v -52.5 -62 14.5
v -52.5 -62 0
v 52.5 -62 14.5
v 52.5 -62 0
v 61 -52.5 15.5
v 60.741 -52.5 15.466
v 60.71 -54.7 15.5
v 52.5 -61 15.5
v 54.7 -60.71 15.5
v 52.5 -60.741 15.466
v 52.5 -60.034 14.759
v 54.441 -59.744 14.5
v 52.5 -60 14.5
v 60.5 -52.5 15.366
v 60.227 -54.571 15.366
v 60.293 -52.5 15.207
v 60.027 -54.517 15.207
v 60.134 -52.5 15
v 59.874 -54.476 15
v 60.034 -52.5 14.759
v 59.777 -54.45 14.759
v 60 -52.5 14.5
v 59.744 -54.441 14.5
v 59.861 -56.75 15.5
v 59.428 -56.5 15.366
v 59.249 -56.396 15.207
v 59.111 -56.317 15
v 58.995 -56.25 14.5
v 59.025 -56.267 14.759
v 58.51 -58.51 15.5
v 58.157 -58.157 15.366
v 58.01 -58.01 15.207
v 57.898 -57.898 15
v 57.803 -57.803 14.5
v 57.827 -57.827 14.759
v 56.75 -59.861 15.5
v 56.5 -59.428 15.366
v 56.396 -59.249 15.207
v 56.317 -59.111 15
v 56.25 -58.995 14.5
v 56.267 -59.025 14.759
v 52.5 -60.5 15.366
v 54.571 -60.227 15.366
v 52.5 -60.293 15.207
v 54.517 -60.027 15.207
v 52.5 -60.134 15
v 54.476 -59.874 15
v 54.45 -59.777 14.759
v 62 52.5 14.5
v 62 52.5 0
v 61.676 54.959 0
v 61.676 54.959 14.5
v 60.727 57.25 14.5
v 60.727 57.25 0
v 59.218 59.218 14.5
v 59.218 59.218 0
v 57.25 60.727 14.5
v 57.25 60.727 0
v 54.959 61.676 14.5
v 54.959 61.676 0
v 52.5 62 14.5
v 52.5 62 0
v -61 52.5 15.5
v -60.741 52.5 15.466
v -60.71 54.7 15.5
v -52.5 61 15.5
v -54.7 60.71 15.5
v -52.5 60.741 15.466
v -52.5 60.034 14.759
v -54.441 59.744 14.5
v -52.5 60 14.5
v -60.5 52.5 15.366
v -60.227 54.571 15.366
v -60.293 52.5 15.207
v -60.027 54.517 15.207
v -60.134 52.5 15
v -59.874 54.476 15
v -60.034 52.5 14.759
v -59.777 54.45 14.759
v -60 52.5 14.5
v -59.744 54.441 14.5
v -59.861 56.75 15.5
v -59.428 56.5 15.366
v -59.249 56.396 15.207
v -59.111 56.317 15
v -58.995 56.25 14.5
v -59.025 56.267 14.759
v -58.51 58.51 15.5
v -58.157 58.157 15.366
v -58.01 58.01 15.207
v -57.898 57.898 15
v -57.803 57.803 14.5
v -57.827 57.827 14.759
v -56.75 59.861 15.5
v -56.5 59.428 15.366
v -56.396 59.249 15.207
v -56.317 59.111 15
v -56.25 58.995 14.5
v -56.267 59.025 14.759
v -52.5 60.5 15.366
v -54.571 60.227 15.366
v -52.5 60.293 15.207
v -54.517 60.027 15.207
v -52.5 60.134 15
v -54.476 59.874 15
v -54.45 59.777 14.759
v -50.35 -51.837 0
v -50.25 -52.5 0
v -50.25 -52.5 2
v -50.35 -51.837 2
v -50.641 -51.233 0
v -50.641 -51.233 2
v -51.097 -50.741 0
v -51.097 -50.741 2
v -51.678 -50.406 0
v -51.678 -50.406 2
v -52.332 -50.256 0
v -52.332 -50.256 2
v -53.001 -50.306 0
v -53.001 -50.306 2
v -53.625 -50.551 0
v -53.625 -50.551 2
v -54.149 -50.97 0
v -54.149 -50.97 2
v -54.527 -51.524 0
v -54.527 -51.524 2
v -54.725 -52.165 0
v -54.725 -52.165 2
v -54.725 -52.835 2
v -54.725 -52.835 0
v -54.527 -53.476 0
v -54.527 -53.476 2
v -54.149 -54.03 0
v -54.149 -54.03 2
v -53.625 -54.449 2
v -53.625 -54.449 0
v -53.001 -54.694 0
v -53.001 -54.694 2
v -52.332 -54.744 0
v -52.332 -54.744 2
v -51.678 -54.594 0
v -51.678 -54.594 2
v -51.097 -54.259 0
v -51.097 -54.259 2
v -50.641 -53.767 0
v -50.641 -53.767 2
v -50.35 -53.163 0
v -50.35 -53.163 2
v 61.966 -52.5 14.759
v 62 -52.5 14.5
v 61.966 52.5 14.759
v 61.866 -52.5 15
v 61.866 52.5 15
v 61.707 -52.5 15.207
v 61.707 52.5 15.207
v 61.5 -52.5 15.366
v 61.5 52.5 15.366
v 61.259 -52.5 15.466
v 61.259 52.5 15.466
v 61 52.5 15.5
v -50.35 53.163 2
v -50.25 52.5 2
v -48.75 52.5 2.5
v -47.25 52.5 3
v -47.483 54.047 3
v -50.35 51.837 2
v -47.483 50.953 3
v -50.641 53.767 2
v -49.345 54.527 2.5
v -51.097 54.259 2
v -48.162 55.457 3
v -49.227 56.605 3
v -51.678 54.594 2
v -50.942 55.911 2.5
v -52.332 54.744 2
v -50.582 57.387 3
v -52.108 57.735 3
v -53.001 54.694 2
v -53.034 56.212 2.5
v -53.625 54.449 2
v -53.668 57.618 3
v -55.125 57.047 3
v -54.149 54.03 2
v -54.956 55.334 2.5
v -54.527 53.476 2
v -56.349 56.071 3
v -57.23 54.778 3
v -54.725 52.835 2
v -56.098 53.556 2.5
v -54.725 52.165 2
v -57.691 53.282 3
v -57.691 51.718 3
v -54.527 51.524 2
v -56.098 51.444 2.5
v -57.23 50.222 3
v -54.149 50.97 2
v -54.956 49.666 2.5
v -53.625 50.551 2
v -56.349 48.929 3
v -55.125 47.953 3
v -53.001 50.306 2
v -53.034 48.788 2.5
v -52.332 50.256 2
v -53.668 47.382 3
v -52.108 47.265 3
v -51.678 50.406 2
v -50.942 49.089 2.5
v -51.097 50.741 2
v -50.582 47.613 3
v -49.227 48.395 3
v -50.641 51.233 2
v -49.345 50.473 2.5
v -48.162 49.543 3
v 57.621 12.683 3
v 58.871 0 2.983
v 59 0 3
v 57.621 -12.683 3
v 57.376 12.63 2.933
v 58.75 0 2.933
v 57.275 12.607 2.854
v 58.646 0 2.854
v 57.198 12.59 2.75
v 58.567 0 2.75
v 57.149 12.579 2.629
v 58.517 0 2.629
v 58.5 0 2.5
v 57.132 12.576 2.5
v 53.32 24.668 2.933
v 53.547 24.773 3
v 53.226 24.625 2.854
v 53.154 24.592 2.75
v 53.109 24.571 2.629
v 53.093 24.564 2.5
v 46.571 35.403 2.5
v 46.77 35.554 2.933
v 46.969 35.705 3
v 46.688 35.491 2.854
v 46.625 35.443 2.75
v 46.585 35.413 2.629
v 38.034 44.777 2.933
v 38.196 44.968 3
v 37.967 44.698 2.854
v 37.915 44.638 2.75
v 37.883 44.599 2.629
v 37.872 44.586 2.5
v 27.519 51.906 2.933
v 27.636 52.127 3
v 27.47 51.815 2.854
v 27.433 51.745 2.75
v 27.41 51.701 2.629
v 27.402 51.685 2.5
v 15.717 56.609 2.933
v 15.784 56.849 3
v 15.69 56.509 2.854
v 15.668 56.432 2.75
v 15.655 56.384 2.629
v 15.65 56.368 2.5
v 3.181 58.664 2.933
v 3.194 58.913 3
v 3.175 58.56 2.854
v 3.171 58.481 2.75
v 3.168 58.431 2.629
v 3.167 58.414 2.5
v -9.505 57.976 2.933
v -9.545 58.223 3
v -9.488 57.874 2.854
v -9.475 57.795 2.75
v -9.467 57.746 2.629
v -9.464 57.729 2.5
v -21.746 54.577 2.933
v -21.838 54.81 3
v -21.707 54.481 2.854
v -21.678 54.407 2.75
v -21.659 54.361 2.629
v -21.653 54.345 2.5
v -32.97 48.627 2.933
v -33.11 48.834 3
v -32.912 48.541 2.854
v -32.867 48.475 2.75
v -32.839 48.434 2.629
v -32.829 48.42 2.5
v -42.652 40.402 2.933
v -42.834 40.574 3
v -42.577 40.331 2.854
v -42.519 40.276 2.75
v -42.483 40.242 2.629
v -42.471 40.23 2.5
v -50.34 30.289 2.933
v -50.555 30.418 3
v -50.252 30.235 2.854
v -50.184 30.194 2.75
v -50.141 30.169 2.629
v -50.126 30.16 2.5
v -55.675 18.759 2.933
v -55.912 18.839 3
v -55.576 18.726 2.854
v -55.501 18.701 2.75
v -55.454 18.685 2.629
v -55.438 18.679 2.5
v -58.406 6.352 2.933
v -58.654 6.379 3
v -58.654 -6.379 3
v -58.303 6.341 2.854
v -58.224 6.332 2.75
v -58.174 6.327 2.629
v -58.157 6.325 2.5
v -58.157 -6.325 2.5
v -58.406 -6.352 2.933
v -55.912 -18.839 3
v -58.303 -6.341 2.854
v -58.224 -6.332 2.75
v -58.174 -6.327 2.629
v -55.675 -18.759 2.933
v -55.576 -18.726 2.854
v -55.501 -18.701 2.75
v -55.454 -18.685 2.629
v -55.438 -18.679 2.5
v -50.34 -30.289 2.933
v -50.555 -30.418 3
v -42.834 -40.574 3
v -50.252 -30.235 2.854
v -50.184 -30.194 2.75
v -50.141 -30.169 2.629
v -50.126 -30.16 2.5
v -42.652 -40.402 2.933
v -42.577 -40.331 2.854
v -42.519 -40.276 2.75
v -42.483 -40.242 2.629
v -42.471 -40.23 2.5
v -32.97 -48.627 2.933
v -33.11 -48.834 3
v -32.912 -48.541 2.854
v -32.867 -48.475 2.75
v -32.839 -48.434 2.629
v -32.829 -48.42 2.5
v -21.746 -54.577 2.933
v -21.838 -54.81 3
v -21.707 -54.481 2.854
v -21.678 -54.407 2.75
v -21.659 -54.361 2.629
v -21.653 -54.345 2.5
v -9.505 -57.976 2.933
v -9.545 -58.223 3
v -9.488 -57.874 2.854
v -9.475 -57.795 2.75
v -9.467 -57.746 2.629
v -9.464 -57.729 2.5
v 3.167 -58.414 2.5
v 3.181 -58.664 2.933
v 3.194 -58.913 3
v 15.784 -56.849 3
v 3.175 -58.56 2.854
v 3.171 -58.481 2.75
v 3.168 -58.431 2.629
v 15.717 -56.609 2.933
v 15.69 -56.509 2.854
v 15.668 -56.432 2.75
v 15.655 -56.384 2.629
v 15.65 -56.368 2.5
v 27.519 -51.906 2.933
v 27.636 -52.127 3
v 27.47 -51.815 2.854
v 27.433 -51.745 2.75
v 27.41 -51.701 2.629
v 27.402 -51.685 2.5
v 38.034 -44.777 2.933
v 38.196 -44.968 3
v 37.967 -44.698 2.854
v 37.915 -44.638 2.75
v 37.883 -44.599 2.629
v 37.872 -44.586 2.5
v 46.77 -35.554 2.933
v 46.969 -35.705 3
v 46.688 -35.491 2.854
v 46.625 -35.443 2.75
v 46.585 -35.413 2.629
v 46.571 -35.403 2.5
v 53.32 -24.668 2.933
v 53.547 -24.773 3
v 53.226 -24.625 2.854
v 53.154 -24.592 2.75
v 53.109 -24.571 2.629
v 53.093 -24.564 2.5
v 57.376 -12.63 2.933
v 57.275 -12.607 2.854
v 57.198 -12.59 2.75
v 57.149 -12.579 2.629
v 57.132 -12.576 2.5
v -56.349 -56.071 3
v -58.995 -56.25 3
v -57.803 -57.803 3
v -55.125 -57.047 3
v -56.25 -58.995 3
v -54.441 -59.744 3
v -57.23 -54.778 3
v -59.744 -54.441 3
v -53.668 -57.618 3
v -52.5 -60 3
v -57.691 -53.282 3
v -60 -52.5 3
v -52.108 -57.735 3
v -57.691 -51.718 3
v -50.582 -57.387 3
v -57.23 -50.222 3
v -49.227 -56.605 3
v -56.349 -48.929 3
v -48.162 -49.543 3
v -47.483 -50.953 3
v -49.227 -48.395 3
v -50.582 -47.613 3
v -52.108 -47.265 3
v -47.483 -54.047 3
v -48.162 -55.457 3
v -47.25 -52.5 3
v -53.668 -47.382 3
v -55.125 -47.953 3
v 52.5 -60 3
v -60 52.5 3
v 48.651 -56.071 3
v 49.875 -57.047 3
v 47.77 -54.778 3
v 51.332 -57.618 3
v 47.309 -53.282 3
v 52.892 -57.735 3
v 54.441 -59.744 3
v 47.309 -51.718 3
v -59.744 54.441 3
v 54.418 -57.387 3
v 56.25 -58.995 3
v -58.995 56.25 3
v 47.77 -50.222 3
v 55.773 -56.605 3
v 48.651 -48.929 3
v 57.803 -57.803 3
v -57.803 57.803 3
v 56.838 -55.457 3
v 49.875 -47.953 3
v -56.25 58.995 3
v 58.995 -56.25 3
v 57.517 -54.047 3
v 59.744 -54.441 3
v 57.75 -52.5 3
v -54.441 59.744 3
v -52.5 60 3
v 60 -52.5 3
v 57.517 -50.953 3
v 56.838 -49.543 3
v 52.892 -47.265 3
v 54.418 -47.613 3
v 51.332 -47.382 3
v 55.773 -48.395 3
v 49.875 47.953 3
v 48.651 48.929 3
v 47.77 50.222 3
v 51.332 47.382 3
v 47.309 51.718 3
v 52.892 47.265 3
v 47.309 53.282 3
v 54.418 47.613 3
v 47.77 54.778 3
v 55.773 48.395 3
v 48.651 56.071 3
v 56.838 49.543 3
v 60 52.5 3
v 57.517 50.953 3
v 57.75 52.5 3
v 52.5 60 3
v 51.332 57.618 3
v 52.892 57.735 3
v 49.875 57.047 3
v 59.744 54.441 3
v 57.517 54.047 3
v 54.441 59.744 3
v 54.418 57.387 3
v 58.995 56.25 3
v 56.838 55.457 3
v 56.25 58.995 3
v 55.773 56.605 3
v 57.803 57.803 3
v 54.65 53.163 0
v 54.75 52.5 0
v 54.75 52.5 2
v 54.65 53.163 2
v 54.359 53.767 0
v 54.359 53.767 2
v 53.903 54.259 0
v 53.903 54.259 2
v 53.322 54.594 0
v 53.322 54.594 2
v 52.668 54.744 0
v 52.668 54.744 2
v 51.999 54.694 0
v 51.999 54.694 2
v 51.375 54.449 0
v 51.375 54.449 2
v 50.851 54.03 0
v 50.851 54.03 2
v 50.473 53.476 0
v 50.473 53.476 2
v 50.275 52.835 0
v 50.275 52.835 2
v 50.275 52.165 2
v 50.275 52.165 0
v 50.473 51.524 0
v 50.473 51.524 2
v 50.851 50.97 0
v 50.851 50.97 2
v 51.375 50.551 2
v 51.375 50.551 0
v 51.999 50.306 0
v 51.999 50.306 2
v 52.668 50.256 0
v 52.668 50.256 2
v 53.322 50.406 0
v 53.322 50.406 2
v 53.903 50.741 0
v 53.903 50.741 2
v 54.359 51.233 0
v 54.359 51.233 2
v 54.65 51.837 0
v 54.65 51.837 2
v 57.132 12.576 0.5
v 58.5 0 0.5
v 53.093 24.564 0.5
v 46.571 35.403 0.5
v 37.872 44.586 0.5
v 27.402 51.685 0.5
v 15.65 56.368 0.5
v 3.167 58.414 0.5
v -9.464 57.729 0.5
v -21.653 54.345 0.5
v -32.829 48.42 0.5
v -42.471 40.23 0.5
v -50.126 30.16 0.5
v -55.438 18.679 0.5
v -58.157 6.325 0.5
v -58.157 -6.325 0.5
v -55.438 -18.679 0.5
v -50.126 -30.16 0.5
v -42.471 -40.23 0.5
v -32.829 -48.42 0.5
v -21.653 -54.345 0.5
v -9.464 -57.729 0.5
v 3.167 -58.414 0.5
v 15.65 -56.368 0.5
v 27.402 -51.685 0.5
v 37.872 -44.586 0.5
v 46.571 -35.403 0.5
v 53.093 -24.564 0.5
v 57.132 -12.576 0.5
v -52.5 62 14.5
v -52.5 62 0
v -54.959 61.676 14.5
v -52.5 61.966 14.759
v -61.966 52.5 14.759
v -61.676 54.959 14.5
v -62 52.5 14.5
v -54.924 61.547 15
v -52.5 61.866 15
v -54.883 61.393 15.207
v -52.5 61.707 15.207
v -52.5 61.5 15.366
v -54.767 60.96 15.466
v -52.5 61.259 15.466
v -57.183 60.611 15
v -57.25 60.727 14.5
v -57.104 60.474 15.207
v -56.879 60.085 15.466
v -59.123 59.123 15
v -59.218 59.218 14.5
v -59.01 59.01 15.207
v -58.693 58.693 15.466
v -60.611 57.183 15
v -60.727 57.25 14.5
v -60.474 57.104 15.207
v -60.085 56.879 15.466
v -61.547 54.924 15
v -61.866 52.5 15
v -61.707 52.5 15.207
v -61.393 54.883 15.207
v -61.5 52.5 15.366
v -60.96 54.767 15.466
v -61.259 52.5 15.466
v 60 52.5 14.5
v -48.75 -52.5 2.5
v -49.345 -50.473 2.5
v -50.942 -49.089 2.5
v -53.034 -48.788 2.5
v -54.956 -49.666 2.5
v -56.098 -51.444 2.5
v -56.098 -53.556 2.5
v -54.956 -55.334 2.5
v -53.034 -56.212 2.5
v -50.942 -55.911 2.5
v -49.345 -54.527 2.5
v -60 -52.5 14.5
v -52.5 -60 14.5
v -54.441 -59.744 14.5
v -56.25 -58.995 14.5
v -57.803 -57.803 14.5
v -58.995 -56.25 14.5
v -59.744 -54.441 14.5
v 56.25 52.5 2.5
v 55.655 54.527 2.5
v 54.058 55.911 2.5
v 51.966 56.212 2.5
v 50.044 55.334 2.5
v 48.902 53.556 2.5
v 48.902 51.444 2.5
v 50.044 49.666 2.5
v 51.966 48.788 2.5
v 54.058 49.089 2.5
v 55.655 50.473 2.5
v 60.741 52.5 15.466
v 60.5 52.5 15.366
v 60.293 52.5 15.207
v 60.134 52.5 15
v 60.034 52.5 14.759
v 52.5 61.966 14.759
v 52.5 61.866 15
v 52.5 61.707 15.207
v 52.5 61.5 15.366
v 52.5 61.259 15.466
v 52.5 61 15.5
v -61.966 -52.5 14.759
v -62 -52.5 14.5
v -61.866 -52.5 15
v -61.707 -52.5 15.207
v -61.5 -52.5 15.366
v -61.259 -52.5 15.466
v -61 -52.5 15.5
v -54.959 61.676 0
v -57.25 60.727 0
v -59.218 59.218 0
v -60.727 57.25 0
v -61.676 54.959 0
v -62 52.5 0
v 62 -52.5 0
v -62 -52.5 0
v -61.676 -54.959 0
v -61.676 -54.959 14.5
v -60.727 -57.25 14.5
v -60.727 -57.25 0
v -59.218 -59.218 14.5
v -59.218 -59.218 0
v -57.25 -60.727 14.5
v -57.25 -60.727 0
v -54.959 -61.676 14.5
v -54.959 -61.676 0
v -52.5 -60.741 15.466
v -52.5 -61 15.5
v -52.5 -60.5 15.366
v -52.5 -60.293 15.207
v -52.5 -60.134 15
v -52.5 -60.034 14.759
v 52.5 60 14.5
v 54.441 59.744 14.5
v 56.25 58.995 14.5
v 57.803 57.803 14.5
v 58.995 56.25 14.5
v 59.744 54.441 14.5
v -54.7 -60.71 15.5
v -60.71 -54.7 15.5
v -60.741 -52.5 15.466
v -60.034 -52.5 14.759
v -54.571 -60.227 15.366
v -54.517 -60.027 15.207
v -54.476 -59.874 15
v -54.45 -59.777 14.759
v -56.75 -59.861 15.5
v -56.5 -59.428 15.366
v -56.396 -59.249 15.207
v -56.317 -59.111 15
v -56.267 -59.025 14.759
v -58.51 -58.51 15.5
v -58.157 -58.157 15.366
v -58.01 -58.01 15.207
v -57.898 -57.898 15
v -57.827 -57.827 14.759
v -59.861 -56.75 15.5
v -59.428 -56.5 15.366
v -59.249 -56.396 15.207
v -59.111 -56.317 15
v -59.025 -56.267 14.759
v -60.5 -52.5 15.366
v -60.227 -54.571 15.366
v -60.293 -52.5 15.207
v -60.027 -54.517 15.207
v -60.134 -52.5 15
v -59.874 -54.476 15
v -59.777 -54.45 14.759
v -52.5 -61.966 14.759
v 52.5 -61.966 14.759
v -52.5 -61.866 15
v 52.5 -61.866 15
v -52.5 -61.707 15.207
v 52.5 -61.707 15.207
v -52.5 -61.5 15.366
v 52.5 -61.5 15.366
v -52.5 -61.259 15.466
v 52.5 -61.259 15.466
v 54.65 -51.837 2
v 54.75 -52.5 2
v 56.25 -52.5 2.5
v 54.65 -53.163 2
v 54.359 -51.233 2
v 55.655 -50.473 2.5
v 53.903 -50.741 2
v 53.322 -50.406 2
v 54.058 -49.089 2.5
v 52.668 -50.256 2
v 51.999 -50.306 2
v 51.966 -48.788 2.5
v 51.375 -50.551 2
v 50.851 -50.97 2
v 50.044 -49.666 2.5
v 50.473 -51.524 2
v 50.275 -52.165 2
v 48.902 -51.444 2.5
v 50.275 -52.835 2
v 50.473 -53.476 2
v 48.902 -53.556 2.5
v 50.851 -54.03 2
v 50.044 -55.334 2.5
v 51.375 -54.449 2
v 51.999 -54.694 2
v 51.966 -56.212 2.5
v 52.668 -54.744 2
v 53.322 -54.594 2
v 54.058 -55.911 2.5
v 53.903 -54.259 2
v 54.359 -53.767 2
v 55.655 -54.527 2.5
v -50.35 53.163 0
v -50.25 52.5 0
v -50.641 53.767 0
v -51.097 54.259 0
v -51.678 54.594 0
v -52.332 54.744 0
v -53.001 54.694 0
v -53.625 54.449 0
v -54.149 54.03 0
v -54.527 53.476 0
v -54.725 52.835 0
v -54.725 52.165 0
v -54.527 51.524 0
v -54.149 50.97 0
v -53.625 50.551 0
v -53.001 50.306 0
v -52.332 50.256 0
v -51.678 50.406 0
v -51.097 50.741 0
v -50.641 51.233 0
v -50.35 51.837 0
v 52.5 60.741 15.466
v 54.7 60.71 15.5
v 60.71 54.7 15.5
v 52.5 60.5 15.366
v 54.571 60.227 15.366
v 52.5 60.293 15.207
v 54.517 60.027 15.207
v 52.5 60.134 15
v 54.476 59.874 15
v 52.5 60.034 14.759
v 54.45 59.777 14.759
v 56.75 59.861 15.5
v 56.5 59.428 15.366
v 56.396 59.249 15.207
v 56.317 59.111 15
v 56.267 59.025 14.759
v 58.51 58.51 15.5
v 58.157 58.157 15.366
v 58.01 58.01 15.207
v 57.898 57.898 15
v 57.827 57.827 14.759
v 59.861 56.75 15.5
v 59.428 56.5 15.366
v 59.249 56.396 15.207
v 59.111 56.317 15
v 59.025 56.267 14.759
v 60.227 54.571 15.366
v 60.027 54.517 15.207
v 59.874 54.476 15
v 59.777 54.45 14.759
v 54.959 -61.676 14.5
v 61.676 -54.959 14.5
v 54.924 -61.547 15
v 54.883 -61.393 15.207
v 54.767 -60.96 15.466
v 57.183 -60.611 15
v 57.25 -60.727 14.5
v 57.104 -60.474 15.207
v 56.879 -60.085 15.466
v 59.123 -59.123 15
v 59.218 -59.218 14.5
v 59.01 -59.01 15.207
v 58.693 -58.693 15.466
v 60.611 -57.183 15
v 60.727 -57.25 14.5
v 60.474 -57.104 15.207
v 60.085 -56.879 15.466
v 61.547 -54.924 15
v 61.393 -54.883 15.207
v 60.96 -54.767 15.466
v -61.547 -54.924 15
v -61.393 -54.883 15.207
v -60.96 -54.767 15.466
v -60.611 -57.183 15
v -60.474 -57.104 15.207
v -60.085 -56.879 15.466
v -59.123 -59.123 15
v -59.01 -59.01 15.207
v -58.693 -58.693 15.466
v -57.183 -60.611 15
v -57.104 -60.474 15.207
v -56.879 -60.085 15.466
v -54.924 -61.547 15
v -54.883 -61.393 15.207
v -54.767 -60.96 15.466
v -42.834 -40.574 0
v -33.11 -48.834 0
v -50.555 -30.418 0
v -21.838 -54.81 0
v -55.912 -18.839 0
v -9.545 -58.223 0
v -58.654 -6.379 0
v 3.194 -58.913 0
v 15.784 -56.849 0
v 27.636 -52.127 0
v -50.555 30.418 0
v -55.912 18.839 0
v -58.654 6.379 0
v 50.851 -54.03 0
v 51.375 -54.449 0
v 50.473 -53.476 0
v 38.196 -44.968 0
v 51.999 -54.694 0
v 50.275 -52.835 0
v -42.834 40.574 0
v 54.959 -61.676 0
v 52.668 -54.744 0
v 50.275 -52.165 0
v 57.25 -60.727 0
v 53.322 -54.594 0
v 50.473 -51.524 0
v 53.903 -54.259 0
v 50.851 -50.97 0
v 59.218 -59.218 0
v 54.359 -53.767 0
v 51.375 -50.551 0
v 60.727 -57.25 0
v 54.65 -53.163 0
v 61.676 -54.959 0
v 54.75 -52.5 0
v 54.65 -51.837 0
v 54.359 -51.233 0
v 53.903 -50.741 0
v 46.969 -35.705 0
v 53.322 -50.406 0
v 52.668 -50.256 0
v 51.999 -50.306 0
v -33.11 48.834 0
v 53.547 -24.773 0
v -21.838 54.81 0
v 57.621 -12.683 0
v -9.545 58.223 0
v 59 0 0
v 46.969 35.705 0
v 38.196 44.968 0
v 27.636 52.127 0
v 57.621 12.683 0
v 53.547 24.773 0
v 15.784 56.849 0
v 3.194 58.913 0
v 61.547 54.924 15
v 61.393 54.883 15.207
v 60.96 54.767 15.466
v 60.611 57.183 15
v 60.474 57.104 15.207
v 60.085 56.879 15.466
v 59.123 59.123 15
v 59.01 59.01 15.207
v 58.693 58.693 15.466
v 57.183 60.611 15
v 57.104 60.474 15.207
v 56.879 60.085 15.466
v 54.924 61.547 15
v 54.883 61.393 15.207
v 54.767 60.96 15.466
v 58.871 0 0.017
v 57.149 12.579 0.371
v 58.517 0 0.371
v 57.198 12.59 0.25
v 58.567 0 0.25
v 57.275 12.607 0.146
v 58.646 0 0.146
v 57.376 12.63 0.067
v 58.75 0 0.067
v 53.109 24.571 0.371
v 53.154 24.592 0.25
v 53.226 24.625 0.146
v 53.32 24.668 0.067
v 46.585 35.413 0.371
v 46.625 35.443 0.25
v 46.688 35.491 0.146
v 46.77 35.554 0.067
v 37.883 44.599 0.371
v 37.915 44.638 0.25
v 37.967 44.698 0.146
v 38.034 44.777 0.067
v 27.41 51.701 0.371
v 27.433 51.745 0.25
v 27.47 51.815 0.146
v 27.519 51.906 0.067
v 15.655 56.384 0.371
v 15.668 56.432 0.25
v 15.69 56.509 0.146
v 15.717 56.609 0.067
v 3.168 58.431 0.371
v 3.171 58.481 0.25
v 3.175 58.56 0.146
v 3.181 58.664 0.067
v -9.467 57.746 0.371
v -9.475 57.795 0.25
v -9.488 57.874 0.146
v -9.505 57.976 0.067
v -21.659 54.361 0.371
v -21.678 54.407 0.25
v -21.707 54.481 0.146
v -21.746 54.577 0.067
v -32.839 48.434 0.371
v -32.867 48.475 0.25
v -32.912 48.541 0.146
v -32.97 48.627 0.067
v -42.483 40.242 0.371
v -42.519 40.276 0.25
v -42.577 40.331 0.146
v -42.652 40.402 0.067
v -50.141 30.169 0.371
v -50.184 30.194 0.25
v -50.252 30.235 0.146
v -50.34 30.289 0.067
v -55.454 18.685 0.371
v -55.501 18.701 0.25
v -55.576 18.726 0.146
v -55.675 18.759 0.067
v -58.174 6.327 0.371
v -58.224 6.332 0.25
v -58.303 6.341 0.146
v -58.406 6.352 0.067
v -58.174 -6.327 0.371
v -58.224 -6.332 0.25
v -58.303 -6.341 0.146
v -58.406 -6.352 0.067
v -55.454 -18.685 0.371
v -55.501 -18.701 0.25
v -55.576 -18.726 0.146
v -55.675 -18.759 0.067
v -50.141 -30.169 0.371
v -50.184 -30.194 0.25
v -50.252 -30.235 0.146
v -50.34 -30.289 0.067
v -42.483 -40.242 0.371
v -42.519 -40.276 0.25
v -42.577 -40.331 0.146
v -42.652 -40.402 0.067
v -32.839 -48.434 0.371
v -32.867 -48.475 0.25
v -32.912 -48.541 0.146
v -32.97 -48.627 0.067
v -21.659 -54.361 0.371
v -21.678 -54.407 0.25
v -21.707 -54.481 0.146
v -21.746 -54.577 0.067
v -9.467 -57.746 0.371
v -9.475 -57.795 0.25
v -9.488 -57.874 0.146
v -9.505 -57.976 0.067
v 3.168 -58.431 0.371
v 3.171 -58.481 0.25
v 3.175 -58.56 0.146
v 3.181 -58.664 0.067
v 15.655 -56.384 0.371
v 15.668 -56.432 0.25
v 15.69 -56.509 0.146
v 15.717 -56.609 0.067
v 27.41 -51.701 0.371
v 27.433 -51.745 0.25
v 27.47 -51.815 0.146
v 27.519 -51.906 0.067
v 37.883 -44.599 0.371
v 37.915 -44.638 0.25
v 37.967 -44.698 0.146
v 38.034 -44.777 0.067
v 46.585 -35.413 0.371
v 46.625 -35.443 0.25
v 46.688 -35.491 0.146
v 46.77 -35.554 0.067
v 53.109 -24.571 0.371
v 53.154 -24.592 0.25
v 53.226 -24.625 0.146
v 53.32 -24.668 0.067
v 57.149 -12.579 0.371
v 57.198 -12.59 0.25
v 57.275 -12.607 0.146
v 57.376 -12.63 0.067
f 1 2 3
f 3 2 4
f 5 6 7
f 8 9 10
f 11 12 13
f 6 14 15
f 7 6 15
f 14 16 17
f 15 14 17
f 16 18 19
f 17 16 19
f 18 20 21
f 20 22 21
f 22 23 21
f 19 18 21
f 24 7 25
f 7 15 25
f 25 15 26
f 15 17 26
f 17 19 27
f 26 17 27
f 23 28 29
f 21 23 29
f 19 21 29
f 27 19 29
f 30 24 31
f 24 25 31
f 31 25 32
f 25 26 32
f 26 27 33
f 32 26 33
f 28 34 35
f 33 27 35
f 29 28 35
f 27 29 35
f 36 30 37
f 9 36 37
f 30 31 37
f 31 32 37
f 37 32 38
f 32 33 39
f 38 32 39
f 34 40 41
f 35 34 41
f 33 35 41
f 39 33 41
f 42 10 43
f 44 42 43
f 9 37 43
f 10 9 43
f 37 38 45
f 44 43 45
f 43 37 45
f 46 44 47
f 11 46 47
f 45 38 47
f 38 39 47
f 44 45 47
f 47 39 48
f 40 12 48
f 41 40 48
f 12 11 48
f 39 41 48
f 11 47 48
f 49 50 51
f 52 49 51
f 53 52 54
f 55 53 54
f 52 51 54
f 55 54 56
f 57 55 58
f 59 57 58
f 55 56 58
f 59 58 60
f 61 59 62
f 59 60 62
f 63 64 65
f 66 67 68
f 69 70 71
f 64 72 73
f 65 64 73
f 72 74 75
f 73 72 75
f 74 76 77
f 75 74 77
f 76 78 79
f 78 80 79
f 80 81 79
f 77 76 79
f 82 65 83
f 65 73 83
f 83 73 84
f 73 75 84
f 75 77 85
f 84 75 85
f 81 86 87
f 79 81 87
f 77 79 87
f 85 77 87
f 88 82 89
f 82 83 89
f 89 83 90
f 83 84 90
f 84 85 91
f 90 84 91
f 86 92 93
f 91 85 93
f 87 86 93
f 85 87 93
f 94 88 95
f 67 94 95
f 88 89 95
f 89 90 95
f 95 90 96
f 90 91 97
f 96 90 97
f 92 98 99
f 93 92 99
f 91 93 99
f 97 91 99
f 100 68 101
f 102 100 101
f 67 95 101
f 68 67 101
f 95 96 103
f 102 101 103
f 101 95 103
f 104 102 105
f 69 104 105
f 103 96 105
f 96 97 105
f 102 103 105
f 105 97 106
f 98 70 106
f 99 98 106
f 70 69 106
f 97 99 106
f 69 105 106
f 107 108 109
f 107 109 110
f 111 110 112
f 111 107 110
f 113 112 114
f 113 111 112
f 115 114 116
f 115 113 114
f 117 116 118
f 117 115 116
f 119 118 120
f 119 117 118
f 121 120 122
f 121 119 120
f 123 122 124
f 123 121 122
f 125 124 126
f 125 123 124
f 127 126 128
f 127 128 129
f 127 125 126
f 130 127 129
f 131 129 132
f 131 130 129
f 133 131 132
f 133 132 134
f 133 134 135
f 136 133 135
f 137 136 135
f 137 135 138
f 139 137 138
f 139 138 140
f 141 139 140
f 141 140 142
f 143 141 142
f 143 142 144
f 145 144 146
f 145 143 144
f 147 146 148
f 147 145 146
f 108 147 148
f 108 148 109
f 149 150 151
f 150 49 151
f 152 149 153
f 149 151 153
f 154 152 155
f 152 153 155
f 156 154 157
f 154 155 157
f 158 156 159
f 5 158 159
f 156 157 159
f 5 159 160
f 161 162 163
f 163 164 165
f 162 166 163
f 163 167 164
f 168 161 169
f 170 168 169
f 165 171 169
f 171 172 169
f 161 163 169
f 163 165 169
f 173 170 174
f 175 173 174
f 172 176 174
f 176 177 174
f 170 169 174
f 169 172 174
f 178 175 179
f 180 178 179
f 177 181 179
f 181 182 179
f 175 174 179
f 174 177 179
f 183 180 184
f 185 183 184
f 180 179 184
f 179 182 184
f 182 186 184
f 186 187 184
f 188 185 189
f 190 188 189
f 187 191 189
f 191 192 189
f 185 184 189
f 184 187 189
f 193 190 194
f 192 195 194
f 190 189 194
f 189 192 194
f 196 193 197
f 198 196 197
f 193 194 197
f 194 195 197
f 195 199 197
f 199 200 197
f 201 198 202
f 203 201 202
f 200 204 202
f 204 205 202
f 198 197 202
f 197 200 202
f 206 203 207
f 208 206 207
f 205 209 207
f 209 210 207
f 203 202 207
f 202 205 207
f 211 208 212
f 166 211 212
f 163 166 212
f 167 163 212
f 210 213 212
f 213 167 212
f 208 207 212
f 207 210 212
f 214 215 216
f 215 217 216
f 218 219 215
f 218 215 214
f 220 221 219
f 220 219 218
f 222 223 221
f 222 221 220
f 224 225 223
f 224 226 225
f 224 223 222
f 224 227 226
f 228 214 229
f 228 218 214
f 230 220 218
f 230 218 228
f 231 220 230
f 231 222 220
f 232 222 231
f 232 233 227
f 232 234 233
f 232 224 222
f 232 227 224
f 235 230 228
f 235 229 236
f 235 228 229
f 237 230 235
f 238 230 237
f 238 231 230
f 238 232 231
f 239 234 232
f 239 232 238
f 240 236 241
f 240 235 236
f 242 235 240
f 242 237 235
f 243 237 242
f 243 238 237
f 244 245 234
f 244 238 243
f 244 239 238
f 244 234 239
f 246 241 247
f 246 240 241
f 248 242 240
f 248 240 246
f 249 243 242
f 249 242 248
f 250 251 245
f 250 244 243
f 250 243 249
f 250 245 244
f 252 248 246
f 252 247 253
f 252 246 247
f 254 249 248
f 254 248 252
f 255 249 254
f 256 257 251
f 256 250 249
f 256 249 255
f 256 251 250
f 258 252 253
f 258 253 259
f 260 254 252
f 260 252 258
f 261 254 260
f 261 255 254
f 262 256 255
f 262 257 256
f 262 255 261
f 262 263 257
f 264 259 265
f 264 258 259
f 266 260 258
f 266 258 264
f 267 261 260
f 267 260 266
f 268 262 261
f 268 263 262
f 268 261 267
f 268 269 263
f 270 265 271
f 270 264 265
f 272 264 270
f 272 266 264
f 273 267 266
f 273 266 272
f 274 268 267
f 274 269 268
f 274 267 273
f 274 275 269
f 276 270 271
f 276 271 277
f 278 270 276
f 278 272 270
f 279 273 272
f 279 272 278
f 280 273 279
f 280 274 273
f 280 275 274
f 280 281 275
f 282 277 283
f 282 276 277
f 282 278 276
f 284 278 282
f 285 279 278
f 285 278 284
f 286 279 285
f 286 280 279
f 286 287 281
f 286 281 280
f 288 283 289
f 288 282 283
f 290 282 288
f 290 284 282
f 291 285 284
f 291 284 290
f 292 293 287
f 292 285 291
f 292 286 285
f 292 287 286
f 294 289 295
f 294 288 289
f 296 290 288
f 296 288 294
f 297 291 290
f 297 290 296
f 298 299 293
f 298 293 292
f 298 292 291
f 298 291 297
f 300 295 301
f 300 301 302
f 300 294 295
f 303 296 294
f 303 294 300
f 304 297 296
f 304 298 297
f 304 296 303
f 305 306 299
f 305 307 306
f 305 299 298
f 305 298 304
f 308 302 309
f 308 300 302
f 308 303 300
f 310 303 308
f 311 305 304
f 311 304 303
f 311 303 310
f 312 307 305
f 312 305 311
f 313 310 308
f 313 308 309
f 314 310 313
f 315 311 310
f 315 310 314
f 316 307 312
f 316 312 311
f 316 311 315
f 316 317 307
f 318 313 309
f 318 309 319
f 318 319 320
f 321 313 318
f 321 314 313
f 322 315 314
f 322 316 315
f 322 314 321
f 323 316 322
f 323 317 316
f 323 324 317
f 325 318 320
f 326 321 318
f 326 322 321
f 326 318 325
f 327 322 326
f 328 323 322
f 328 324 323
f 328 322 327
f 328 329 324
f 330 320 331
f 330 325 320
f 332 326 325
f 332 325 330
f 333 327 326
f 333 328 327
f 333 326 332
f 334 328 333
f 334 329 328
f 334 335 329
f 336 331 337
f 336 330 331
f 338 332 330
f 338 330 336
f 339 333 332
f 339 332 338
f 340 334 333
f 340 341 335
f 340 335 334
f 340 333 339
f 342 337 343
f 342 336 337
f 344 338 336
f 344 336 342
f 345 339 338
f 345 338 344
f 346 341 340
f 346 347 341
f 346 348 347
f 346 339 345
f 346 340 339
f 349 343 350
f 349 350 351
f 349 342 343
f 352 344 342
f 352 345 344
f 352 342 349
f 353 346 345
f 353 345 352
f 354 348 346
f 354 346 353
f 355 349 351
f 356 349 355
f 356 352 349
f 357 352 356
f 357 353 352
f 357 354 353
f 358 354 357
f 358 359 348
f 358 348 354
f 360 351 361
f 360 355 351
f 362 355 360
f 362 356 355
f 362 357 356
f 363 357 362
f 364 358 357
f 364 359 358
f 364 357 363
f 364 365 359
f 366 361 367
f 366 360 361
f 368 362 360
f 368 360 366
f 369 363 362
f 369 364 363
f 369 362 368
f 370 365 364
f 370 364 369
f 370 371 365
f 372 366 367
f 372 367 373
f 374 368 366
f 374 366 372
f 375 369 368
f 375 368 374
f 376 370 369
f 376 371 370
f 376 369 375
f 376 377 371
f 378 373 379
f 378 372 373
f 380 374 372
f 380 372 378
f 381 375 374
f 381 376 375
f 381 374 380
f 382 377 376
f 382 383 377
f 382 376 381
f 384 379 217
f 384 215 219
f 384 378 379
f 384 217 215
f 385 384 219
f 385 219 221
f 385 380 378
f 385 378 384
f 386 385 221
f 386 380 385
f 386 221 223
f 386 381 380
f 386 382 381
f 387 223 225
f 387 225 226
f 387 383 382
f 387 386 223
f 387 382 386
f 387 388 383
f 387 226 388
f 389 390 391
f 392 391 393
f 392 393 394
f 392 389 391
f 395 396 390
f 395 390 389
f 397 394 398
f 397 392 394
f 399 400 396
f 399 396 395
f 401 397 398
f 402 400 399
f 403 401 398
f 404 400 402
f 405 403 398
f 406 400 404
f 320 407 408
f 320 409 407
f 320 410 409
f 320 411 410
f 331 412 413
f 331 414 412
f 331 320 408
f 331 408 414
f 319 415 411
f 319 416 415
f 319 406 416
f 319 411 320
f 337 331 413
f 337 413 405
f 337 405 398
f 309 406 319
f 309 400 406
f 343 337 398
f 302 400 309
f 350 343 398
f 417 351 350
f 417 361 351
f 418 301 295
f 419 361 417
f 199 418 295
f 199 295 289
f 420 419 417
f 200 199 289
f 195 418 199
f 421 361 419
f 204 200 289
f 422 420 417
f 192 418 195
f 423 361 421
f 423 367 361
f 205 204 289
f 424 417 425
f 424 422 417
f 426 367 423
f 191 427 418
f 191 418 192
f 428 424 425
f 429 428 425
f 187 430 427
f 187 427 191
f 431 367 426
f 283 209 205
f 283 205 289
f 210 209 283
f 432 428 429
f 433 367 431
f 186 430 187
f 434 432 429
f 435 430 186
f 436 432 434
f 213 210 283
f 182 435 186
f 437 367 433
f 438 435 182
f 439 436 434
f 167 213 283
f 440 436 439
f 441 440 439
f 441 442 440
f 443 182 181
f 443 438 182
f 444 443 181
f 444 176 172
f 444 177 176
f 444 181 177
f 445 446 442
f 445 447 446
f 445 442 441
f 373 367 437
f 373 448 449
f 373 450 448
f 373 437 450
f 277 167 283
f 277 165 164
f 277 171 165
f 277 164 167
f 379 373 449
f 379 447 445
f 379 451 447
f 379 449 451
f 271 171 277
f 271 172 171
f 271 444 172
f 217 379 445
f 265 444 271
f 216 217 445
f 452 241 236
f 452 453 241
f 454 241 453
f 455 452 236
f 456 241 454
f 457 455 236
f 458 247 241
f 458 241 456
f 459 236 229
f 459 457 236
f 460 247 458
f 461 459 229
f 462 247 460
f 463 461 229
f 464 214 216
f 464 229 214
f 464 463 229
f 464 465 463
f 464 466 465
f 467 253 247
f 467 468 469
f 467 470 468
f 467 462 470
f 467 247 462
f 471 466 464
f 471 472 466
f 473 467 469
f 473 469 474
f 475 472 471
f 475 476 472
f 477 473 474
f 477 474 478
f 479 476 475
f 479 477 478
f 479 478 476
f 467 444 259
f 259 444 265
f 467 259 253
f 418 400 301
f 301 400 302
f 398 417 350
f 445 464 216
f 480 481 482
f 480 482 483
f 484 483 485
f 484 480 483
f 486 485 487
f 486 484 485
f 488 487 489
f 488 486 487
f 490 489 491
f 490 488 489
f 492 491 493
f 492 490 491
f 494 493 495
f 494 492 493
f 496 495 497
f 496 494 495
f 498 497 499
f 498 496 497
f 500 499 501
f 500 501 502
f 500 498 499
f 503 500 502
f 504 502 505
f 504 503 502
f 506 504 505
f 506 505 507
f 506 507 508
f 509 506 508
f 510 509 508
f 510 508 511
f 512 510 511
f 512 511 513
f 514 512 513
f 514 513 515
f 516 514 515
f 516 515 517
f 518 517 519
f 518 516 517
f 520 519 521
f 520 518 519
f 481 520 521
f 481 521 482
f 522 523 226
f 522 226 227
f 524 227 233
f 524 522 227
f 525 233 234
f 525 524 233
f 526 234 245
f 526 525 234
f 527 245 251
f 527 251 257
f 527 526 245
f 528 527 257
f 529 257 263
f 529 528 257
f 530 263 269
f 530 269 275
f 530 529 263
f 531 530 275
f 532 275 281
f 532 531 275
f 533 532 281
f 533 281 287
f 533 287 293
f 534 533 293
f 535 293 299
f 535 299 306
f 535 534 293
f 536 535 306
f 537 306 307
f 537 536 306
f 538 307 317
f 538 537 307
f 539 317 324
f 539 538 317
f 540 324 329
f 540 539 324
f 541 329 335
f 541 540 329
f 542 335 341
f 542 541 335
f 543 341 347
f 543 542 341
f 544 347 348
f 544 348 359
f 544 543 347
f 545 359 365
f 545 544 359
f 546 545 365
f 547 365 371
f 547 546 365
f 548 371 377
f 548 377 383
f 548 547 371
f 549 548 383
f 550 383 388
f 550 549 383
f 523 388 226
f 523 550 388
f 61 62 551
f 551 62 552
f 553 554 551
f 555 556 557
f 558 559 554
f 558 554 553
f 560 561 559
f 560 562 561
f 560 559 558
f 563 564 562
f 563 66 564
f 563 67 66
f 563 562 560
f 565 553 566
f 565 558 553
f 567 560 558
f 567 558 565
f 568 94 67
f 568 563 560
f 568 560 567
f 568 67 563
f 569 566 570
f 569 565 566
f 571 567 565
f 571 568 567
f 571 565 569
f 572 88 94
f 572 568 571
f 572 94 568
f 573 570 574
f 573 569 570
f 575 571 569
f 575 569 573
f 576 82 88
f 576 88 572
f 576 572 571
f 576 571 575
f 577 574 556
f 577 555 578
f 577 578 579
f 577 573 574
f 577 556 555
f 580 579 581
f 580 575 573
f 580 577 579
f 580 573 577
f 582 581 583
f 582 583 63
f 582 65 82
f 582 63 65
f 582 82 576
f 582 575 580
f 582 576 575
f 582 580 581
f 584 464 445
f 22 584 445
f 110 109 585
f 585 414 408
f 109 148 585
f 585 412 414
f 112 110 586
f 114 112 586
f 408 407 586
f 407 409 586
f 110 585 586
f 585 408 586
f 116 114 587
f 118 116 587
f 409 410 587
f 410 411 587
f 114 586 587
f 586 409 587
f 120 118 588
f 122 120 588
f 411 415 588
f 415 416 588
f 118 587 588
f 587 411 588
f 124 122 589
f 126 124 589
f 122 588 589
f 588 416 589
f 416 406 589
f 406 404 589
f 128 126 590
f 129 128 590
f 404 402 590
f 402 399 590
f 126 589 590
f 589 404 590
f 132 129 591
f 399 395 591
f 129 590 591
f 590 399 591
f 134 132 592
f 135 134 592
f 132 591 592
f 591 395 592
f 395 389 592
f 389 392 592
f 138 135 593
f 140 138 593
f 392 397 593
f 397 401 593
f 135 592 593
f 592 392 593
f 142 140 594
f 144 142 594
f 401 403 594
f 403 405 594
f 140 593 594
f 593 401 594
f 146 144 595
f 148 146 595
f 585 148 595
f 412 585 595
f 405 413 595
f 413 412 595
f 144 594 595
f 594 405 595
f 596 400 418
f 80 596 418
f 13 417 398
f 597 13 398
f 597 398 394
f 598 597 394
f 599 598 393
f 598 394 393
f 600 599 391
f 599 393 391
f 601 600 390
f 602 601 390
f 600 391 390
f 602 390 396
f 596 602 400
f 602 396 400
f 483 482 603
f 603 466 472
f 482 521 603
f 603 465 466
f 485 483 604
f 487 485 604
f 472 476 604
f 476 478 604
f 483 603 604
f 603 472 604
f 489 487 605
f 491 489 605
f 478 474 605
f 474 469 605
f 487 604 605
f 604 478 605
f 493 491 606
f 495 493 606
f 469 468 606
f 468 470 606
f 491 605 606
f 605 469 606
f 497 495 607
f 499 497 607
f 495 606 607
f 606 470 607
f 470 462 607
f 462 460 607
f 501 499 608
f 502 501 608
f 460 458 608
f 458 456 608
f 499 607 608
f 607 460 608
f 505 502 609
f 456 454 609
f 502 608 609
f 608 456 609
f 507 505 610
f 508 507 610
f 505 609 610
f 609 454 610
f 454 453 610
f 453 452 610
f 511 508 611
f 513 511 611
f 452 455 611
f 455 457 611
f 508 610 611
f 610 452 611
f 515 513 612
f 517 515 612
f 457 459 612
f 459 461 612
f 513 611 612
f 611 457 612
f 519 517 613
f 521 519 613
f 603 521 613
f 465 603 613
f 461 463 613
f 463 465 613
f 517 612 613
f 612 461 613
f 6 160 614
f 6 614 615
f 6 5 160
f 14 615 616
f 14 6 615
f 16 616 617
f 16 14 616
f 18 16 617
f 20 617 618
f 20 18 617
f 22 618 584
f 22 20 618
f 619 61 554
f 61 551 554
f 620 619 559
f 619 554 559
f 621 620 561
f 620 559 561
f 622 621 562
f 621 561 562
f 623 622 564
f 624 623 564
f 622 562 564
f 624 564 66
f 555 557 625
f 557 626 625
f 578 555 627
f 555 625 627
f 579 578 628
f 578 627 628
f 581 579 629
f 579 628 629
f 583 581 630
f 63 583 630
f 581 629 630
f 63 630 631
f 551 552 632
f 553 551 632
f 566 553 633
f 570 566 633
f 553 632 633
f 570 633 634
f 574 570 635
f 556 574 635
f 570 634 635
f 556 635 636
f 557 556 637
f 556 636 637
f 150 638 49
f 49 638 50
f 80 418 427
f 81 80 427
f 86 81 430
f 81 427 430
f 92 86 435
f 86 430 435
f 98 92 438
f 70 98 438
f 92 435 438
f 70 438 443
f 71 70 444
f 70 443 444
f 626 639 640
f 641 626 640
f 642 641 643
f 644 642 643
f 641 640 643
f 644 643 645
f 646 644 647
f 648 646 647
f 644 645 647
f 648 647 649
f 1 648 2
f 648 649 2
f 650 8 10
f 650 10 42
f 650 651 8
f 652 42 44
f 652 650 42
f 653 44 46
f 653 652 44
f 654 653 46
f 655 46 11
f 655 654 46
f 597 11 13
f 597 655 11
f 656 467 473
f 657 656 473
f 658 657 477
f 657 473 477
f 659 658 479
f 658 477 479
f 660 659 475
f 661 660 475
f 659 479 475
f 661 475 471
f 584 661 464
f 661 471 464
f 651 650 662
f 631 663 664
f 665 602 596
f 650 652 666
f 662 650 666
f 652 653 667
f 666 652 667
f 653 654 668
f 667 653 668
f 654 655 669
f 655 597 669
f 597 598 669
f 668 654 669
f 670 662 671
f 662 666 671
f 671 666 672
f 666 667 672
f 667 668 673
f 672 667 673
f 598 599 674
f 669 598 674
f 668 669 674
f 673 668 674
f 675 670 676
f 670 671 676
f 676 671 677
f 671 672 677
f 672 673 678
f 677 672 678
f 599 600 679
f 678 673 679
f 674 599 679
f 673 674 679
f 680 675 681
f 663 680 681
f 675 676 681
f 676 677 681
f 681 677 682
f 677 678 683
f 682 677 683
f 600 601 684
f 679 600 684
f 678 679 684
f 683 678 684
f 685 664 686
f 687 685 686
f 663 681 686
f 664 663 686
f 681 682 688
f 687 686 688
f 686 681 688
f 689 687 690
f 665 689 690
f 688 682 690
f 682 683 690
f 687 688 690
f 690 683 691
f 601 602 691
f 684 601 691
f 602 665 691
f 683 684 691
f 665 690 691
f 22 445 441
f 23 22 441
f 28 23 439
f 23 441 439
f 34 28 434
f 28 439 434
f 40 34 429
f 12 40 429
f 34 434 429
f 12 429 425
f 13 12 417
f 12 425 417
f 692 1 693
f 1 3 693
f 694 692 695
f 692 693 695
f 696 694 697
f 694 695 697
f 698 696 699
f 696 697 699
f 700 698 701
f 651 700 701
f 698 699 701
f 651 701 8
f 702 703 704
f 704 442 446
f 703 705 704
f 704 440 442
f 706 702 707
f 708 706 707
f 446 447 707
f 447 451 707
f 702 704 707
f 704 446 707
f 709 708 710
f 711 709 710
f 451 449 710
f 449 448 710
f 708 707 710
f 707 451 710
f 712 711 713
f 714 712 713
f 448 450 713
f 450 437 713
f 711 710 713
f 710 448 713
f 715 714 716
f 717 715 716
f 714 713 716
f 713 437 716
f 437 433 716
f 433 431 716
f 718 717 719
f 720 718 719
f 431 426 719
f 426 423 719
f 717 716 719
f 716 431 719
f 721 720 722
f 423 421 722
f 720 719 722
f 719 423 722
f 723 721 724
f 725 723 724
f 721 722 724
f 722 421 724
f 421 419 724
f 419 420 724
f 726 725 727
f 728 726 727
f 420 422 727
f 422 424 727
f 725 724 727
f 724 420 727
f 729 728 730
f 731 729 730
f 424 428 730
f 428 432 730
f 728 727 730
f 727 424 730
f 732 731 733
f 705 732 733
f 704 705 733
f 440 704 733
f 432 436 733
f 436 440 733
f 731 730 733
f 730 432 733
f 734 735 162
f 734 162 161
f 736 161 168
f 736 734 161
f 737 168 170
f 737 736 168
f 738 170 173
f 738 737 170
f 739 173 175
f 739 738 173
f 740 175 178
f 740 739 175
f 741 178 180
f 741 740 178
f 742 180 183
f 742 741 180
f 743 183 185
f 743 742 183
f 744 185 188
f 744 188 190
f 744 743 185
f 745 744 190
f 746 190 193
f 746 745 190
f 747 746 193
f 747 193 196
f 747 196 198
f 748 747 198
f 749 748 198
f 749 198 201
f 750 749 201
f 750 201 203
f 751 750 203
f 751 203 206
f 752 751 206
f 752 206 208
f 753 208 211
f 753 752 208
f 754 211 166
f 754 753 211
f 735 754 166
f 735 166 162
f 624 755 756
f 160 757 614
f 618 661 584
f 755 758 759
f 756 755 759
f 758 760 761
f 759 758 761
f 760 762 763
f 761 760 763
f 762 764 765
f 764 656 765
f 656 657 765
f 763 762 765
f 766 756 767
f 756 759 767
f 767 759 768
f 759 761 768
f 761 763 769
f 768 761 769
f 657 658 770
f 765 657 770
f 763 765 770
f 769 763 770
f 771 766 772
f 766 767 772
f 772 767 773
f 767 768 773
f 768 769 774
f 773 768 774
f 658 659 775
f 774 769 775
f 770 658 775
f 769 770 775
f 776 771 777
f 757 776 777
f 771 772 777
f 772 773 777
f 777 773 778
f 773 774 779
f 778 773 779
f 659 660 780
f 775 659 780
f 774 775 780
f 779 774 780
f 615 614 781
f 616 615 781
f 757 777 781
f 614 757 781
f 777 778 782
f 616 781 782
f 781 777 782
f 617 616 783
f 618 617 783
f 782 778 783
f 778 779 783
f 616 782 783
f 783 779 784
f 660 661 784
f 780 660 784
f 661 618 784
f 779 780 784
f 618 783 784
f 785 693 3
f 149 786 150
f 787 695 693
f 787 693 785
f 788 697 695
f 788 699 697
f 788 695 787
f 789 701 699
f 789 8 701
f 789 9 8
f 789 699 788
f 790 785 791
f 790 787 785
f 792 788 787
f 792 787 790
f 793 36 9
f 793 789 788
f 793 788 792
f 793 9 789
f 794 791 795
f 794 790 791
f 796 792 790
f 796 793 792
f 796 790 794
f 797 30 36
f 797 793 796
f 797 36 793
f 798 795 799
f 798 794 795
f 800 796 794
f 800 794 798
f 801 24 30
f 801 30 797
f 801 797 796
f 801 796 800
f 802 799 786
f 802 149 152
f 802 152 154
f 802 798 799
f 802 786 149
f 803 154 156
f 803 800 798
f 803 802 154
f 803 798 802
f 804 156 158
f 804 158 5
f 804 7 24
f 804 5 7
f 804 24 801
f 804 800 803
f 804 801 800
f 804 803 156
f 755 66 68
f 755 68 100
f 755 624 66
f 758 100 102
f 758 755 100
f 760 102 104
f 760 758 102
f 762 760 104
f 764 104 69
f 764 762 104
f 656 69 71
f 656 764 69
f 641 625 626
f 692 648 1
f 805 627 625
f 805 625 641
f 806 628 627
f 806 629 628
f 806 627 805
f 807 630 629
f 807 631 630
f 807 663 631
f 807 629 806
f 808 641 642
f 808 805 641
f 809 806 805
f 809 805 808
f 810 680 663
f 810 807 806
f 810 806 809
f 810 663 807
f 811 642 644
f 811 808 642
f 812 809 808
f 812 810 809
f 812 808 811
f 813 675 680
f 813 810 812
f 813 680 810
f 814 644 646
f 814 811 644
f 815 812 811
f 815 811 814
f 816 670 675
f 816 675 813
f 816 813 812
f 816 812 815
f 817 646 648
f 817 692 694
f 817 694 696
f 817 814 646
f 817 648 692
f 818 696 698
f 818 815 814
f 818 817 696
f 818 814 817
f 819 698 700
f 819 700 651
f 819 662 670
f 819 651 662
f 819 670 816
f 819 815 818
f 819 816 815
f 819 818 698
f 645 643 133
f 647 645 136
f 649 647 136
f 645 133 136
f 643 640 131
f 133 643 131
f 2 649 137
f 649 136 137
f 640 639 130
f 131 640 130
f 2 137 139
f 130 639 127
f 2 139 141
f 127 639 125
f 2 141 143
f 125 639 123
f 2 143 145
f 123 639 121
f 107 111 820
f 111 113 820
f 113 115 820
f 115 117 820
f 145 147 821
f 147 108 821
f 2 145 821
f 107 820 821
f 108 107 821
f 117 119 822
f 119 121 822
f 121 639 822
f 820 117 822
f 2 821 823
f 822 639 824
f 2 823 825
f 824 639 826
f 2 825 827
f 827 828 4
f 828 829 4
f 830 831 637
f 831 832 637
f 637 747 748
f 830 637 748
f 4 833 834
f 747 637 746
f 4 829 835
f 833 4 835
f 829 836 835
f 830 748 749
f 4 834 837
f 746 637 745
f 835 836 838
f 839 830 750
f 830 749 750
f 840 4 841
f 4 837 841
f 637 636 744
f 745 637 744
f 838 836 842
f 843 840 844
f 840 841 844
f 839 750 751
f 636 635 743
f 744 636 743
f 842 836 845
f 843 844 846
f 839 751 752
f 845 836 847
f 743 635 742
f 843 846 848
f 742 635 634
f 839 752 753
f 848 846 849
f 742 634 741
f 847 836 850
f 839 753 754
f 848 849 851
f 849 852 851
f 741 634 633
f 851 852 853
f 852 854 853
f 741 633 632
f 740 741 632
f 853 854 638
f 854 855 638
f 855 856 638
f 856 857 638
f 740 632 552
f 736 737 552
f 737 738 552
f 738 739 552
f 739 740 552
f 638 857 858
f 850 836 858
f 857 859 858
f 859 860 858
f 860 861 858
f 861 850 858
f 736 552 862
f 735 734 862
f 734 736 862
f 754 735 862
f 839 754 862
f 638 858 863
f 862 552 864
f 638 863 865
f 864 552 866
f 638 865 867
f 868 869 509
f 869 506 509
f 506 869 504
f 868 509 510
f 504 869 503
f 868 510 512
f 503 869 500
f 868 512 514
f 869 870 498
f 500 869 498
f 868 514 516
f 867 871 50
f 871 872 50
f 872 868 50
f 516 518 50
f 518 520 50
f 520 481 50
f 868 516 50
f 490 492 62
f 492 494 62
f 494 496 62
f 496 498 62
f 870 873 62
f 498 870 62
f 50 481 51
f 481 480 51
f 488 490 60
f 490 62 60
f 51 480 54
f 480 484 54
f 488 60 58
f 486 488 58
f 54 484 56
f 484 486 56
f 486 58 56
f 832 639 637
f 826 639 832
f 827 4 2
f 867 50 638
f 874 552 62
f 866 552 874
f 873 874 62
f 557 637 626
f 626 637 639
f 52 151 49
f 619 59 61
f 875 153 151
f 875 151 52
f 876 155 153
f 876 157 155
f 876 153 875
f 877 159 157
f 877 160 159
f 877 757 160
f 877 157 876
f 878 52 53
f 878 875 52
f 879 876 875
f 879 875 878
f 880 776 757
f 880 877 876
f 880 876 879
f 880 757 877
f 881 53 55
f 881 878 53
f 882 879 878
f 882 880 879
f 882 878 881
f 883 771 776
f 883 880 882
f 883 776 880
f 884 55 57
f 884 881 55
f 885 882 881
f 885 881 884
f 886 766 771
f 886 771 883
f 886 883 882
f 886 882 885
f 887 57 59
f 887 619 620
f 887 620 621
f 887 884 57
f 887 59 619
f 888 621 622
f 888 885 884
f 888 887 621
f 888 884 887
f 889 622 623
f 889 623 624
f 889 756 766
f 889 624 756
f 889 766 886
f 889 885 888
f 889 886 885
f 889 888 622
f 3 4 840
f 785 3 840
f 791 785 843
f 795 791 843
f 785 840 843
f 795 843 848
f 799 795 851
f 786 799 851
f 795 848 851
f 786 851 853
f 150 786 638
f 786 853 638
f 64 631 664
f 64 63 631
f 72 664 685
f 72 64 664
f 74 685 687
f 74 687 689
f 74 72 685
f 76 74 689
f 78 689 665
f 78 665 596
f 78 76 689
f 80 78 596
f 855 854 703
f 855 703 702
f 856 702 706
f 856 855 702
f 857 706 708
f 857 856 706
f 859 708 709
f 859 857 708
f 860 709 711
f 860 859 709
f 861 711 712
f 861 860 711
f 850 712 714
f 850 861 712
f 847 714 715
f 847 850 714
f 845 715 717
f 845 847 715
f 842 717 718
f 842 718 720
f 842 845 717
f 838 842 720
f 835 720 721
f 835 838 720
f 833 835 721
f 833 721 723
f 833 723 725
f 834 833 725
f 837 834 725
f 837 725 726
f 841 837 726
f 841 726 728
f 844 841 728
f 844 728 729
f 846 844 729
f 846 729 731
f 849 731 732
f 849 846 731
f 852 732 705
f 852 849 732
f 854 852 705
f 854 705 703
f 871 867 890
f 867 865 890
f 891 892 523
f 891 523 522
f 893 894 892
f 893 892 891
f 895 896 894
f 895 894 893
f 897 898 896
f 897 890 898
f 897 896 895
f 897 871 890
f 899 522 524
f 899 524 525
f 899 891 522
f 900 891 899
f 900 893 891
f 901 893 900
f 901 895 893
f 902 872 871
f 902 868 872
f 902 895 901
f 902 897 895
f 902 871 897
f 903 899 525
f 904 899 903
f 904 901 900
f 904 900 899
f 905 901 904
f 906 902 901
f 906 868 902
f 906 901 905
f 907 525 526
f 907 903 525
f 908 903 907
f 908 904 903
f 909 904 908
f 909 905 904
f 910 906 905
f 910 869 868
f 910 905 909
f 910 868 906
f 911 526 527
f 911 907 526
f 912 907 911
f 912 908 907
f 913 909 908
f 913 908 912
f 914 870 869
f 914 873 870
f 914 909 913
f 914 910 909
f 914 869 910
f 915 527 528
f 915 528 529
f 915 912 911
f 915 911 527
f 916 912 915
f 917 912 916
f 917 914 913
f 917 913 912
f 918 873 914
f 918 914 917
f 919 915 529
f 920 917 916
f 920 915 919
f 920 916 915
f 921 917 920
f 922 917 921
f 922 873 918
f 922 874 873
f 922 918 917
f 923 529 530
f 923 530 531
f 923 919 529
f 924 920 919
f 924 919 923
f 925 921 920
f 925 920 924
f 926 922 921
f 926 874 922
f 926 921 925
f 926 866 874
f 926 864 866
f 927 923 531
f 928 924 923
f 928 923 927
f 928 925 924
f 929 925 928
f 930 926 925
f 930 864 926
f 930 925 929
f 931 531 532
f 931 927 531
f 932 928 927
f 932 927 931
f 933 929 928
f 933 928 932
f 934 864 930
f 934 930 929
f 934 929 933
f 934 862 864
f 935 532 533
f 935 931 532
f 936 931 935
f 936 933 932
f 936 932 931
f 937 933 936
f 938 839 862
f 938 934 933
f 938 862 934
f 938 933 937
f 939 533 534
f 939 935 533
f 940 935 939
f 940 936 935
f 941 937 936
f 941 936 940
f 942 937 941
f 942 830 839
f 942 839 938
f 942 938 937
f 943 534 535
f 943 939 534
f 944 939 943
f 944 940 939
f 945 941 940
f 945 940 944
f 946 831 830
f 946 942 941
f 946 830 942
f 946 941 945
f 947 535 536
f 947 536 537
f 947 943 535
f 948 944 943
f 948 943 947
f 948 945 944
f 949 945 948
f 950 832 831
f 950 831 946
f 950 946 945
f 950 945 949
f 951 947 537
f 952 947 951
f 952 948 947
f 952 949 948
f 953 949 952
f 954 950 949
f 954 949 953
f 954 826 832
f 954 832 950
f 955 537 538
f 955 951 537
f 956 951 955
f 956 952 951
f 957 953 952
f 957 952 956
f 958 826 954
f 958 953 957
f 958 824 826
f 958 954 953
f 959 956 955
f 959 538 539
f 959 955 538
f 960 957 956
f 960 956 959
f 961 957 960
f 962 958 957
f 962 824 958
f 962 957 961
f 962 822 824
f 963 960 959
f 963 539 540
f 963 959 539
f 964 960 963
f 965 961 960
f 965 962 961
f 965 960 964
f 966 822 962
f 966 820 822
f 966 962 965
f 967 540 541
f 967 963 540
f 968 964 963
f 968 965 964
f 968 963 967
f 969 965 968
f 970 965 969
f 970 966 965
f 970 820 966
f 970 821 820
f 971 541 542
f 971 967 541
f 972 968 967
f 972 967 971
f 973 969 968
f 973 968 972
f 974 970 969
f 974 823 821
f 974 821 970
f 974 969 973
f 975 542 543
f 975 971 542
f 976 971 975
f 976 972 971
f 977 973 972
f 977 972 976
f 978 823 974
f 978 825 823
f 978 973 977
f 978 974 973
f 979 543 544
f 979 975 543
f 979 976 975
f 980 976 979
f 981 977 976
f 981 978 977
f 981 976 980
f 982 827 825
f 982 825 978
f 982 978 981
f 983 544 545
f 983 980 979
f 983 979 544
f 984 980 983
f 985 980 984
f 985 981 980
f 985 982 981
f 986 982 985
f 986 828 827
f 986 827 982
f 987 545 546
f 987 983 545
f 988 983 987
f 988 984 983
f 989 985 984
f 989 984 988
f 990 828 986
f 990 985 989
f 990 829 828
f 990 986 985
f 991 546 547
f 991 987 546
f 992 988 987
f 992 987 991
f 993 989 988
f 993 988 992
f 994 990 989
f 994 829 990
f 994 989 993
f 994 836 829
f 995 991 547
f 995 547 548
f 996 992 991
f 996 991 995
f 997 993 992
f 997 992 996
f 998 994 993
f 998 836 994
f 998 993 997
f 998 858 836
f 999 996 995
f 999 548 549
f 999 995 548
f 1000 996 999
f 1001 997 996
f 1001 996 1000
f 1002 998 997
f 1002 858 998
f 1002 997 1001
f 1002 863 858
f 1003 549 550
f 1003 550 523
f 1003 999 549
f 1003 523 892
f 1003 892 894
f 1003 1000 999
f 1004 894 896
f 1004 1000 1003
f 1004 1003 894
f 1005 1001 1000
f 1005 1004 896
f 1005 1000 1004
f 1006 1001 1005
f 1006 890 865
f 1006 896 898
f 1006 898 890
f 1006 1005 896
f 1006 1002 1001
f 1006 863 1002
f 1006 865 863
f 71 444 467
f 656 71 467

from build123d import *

# Parameters (mm, degrees)
F0_R       = 2.25
F0_R_2     = 58.5
F1_DEPTH   = 3
F2_DEPTH   = 15.5
F3_R       = 0.99999
F4_SIZE2   = 3
F4_SIZE    = 1
F4_2_SIZE2 = 3
F4_2_SIZE  = 1
F4_3_SIZE2 = 3
F4_3_SIZE  = 1
F4_4_SIZE2 = 3
F4_4_SIZE  = 1
F5_R       = 0.5
F6_R       = 0.5


# Not quite as in the source:
# - a fillet or chamfer is up to 0.001 mm smaller than in the source, because OpenCascade refuses the exact size


with BuildPart() as f1:
    # F0 (on Top) → F1 (new body)
    with BuildSketch(Plane.XY):
        with BuildLine():
            Line((52.5, 60), (-52.5, 60))
            ThreePointArc((-52.5, 60), (-57.8033008589, 57.8033008589), (-60, 52.5))
            Line((-60, 52.5), (-60, -52.5))
            ThreePointArc((-60, -52.5), (-57.8033008589, -57.8033008589), (-52.5, -60))
            Line((-52.5, -60), (52.5, -60))
            ThreePointArc((52.5, -60), (57.8033008589, -57.8033008589), (60, -52.5))
            Line((60, -52.5), (60, 52.5))
            ThreePointArc((60, 52.5), (57.8033008589, 57.8033008589), (52.5, 60))
        make_face()
        with Locations((-52.5, -52.5)):
            Circle(F0_R, mode=Mode.SUBTRACT)
        with Locations((52.5, -52.5)):
            Circle(F0_R, mode=Mode.SUBTRACT)
        with Locations((-52.5, 52.5)):
            Circle(F0_R, mode=Mode.SUBTRACT)
        Circle(F0_R_2, mode=Mode.SUBTRACT)
        with Locations((52.5, 52.5)):
            Circle(F0_R, mode=Mode.SUBTRACT)
    extrude(amount=F1_DEPTH)

    # F0 (on Top) → F2 (join)
    with BuildSketch(Plane.XY):
        with BuildLine():
            ThreePointArc((-52.5, 62), (-59.2175144213, 59.2175144213), (-62, 52.5))
            Line((-62, 52.5), (-62, -52.5))
            ThreePointArc((-62, -52.5), (-59.2175144213, -59.2175144213), (-52.5, -62))
            Line((-52.5, -62), (52.5, -62))
            ThreePointArc((52.5, -62), (59.2175144213, -59.2175144213), (62, -52.5))
            Line((62, -52.5), (62, 52.5))
            ThreePointArc((62, 52.5), (59.2175144213, 59.2175144213), (52.5, 62))
            Line((52.5, 62), (-52.5, 62))
        make_face()
        with BuildLine():
            ThreePointArc((-60, 52.5), (-57.8033008589, 57.8033008589), (-52.5, 60))
            Line((-52.5, 60), (52.5, 60))
            ThreePointArc((52.5, 60), (57.8033008589, 57.8033008589), (60, 52.5))
            Line((60, 52.5), (60, -52.5))
            ThreePointArc((60, -52.5), (57.8033008589, -57.8033008589), (52.5, -60))
            Line((52.5, -60), (-52.5, -60))
            ThreePointArc((-52.5, -60), (-57.8033008589, -57.8033008589), (-60, -52.5))
            Line((-60, -52.5), (-60, 52.5))
        make_face(mode=Mode.SUBTRACT)
    extrude(amount=F2_DEPTH)

    # F3 (radius 1 in the source; OpenCascade refuses exactly that, so slightly less here)
    f3_edges = [f1.edges().sort_by_distance(p)[0] for p in [
        (-59.217514, 59.217514, 15.5),
        (-62, 0, 15.5),
        (-59.217514, -59.217514, 15.5),
        (0, -62, 15.5),
        (59.217514, -59.217514, 15.5),
        (62, 0, 15.5),
        (59.217514, 59.217514, 15.5),
        (0, 62, 15.5),
        (-57.803301, 57.803301, 15.5),
        (0, 60, 15.5),
        (57.803301, 57.803301, 15.5),
        (60, 0, 15.5),
        (57.803301, -57.803301, 15.5),
        (0, -60, 15.5),
        (-57.803301, -57.803301, 15.5),
        (-60, 0, 15.5),
    ]]
    fillet(f3_edges, radius=F3_R)

    # F4
    f4_edges = [f1.edges().sort_by_distance(p)[0] for p in [
        (-54.75, 52.5, 3),
    ]]
    f4_side = f1.faces().sort_by_distance((-54.75, 52.5, 1.5))[0]
    chamfer(f4_edges, length=F4_SIZE, length2=F4_SIZE2, reference=f4_side)

    # F4#2
    f4_2_edges = [f1.edges().sort_by_distance(p)[0] for p in [
        (-54.75, -52.5, 3),
    ]]
    f4_2_side = f1.faces().sort_by_distance((-54.75, -52.5, 1.5))[0]
    chamfer(f4_2_edges, length=F4_2_SIZE, length2=F4_2_SIZE2, reference=f4_2_side)

    # F4#3
    f4_3_edges = [f1.edges().sort_by_distance(p)[0] for p in [
        (50.25, 52.5, 3),
    ]]
    f4_3_side = f1.faces().sort_by_distance((50.25, 52.5, 1.5))[0]
    chamfer(f4_3_edges, length=F4_3_SIZE, length2=F4_3_SIZE2, reference=f4_3_side)

    # F4#4
    f4_4_edges = [f1.edges().sort_by_distance(p)[0] for p in [
        (50.25, -52.5, 3),
    ]]
    f4_4_side = f1.faces().sort_by_distance((50.25, -52.5, 1.5))[0]
    chamfer(f4_4_edges, length=F4_4_SIZE, length2=F4_4_SIZE2, reference=f4_4_side)

    # F5
    f5_edges = [f1.edges().sort_by_distance(p)[0] for p in [
        (-58.5, 0, 3),
    ]]
    fillet(f5_edges, radius=F5_R)

    # F6
    f6_edges = [f1.edges().sort_by_distance(p)[0] for p in [
        (-58.5, 0, 0),
    ]]
    fillet(f6_edges, radius=F6_R)


solid = f1.part
